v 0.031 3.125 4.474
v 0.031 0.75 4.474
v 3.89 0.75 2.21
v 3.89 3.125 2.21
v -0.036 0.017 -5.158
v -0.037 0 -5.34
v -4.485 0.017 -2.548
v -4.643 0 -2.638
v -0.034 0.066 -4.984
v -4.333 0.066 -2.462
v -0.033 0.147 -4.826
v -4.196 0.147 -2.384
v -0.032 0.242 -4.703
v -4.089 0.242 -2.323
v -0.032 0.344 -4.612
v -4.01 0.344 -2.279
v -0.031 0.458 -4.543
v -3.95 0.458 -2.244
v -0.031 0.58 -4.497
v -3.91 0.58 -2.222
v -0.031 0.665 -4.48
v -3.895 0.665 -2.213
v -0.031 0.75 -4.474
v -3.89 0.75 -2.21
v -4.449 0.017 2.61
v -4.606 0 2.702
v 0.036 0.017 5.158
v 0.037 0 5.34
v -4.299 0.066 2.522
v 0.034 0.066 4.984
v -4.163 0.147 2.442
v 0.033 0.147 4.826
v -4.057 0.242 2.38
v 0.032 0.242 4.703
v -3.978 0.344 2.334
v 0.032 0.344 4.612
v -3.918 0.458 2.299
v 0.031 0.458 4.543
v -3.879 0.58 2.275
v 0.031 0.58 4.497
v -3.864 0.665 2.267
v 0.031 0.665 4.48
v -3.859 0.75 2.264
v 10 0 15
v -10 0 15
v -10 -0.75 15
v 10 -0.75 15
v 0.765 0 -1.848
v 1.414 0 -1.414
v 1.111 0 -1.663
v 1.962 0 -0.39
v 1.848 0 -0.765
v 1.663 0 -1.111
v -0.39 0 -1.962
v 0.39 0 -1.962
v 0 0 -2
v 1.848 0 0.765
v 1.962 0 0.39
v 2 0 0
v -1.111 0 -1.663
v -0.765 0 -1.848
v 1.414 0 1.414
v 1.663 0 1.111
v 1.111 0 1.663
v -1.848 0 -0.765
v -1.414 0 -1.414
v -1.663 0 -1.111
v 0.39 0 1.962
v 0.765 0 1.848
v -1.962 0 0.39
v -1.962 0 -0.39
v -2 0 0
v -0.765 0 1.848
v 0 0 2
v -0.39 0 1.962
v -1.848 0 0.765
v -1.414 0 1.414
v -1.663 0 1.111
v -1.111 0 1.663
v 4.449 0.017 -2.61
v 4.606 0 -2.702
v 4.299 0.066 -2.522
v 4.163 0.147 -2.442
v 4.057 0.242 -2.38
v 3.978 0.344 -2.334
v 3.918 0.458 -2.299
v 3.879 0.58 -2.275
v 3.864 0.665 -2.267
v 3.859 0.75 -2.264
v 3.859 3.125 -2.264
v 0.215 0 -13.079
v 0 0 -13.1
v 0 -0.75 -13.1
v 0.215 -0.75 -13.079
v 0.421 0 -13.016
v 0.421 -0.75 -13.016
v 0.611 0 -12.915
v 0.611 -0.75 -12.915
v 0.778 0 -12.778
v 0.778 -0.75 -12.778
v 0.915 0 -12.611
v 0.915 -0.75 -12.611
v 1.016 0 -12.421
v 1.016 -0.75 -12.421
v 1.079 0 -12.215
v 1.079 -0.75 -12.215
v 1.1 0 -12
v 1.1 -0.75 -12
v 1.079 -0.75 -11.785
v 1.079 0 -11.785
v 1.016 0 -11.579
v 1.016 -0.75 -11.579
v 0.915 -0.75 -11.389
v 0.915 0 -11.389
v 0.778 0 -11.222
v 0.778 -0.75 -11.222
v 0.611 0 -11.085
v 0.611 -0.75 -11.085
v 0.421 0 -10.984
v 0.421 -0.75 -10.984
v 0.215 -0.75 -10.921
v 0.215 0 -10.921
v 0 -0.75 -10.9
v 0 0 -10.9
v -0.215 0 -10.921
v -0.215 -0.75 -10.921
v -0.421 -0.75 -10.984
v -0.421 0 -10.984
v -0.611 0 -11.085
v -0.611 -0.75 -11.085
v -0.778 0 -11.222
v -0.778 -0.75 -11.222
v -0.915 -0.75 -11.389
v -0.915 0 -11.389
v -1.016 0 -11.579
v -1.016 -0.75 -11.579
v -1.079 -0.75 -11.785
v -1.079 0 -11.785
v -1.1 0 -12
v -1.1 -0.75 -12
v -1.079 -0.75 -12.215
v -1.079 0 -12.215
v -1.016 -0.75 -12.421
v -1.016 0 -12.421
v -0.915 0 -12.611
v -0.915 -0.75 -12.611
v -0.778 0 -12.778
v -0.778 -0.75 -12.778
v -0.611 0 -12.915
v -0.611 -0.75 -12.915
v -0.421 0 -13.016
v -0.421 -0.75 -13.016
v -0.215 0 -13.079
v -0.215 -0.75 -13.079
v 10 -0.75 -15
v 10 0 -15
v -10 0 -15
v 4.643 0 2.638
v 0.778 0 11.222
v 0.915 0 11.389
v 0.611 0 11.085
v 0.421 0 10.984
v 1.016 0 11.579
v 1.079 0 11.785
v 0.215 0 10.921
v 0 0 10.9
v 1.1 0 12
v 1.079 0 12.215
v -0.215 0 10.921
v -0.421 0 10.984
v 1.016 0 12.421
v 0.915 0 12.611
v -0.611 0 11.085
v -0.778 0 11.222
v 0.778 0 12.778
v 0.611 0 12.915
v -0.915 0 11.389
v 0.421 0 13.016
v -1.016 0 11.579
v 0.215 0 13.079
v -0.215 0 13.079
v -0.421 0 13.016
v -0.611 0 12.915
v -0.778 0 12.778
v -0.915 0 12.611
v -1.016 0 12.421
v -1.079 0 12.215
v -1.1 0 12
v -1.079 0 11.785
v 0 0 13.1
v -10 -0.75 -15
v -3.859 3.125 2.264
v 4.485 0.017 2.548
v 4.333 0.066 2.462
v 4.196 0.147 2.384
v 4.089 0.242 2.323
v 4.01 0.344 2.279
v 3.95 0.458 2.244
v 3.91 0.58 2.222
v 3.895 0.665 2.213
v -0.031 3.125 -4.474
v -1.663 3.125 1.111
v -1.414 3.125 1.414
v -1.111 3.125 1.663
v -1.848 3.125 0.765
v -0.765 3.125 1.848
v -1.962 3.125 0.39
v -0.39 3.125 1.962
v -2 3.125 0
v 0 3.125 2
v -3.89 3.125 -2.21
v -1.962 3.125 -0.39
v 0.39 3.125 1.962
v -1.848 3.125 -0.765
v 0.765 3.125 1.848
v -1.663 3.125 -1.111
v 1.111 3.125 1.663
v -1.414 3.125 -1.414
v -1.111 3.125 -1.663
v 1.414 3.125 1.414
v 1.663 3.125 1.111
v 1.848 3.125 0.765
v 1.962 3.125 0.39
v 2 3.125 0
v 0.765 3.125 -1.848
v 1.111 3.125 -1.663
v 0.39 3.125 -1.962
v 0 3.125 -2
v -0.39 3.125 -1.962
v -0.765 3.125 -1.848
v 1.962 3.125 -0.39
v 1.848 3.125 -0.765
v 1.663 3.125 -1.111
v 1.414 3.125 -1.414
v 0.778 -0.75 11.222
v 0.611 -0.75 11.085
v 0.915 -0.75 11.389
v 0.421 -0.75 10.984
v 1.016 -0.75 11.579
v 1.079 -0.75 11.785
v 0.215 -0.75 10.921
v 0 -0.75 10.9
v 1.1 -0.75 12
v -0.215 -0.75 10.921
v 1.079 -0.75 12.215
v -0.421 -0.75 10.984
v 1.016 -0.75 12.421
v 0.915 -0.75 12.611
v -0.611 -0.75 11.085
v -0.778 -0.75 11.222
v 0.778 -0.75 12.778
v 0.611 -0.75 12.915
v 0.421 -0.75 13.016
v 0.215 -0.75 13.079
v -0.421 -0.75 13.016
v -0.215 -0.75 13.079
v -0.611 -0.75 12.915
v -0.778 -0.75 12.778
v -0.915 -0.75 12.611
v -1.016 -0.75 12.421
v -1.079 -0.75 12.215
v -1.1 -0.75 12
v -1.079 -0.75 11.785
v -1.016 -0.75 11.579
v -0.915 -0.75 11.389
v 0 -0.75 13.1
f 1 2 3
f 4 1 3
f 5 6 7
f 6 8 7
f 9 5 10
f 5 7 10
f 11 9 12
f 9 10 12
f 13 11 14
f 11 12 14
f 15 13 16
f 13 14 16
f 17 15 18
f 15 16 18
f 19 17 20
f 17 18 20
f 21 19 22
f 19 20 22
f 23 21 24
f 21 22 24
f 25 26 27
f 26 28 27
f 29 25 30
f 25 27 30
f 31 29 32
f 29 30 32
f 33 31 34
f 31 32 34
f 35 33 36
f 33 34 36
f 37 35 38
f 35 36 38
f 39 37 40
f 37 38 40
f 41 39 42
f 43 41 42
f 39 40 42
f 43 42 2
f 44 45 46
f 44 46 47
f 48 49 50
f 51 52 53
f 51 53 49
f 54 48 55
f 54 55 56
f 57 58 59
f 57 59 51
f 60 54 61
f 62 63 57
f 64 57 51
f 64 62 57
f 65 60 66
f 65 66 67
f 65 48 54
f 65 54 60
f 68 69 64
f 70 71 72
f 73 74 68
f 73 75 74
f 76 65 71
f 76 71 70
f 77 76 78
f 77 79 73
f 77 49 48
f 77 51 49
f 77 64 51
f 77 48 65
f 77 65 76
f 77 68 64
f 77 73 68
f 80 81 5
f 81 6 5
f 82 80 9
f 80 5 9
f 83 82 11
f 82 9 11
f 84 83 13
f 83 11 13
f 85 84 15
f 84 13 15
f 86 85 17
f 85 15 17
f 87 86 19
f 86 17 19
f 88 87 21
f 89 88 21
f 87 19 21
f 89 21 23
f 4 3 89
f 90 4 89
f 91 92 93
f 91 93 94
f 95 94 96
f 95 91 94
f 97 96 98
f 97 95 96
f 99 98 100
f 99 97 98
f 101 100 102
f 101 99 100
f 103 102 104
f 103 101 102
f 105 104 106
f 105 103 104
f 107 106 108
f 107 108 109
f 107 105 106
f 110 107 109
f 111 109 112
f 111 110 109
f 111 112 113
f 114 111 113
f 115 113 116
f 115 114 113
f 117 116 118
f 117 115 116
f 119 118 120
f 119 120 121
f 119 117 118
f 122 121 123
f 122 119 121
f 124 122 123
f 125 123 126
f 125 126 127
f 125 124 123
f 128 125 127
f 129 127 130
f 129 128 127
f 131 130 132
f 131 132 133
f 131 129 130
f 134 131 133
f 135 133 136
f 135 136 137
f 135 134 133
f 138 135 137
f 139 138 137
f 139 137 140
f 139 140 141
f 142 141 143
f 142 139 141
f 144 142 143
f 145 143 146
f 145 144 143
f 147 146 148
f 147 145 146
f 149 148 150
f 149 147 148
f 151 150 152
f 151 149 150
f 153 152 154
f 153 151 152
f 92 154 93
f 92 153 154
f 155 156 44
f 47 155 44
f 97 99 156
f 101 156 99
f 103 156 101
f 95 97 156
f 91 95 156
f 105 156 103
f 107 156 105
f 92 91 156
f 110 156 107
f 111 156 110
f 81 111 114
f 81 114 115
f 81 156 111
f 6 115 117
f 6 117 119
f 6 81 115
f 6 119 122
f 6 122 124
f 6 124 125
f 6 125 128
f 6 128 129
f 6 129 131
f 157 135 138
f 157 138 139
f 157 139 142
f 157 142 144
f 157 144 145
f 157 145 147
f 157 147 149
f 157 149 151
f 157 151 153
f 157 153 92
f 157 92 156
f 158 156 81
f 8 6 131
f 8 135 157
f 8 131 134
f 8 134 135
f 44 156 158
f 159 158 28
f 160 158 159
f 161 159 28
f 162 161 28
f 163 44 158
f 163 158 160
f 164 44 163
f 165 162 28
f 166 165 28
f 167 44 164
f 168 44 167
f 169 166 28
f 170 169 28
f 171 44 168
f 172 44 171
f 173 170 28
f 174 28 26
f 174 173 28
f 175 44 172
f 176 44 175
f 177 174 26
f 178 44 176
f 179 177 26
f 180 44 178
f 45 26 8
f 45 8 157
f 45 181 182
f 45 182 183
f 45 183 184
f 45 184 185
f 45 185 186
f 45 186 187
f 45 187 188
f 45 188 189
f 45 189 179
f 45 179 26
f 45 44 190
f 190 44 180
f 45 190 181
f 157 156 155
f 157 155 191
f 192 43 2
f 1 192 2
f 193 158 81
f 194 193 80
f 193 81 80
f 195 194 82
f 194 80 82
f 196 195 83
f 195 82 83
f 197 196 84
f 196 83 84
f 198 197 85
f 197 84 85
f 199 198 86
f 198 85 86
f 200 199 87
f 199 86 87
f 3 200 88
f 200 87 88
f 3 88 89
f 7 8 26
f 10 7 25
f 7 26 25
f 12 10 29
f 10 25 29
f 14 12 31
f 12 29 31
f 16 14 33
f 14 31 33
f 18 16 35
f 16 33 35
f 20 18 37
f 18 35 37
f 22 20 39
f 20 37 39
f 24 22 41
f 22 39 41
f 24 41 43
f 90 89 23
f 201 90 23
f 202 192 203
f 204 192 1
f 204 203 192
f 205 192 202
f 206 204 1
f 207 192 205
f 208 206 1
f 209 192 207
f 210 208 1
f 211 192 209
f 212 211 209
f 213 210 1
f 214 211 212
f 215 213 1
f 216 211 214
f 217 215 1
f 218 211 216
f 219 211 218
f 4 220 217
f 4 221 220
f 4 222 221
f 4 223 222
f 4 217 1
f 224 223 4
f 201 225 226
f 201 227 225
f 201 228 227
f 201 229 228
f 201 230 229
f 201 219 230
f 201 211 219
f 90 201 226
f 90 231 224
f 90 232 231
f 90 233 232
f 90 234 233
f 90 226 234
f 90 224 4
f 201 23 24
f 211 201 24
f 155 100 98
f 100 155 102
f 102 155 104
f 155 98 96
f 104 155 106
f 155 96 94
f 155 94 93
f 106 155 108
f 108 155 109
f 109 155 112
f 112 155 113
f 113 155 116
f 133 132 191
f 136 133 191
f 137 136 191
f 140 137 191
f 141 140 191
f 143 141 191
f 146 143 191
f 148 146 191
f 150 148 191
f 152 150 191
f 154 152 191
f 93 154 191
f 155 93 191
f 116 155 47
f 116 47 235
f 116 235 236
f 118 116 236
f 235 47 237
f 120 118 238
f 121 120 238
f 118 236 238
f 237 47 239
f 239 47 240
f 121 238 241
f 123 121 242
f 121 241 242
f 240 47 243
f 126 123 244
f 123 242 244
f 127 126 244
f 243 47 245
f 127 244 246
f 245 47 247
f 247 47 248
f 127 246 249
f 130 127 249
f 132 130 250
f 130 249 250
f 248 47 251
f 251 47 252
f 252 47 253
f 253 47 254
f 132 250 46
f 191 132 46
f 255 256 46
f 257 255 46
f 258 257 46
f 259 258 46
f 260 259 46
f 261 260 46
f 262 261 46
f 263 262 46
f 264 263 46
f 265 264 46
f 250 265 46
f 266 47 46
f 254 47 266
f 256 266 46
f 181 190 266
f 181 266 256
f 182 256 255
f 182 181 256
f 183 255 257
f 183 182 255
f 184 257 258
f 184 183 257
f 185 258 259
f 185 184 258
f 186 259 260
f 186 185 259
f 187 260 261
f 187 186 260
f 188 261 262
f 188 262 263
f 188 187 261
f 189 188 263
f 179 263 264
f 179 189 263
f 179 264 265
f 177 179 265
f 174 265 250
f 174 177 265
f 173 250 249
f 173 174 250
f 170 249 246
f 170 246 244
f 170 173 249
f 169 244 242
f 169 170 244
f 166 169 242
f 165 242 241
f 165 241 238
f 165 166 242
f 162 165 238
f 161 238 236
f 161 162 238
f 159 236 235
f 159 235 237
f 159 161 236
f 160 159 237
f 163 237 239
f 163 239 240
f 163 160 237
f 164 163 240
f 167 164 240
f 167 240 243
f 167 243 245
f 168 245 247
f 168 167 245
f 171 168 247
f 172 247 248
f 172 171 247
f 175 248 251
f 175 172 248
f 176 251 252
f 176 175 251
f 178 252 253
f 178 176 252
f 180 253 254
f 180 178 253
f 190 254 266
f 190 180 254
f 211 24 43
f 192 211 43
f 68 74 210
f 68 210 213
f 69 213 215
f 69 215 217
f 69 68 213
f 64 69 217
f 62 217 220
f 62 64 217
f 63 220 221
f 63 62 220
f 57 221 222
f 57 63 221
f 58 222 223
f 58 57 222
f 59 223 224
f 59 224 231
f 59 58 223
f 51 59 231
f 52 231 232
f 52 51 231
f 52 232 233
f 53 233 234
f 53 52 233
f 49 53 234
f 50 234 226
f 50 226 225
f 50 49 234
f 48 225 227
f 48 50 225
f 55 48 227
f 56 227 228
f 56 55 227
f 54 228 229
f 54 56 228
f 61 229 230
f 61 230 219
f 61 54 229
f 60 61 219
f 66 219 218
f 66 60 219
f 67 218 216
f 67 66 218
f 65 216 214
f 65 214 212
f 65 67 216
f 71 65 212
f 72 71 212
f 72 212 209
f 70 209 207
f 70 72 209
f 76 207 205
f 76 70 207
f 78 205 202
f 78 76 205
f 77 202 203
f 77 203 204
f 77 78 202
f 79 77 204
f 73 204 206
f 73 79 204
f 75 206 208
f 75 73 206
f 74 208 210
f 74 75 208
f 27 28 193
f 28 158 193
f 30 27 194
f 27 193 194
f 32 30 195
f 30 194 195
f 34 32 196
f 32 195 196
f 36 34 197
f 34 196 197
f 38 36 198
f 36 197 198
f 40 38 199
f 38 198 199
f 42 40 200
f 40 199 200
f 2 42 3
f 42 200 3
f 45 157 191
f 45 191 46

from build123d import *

# Parameters (mm, degrees)
SKETCH1_R      = 2
EXTRUDE1_DEPTH = 3.125
SKETCH2_R      = 1.1
EXTRUDE2_DEPTH = 0.75
FILLET1_R      = 0.75


with BuildPart() as part:
    # Sketch1 → Extrude1 (new body)
    with BuildSketch(Plane(origin=(0, 0, 0), x_dir=(1, 0, 0), z_dir=(0, 1, 0))):
        Polygon((3.859462612, 2.263930582), (-0.030890091, 4.474357958), (-3.890352703, 2.210427376), (-3.859462612, -2.263930582), (0.030890091, -4.474357958), (3.890352703, -2.210427376), align=None)
        with Locations(Location((0, 0, 0), (0, 0, 270))):  # turned: the seam where the file's is
            Circle(SKETCH1_R, mode=Mode.SUBTRACT)
    extrude(amount=EXTRUDE1_DEPTH)

    # Sketch2 → Extrude2 (add)
    with BuildSketch(Plane.XZ):
        Polygon((10, 0), (10, -15), (-10, -15), (-10, 15), (10, 15), align=None)
        with Locations(Location((0, -12, 0), (0, 0, 270))):  # turned: the seam where the file's is
            Circle(SKETCH2_R, mode=Mode.SUBTRACT)
        with Locations(Location((0, 12, 0), (0, 0, 90))):  # turned: the seam where the file's is
            Circle(SKETCH2_R, mode=Mode.SUBTRACT)
    extrude(amount=EXTRUDE2_DEPTH)

    # Fillet1
    fillet1_edges = [part.edges().sort_by_distance(p)[0] for p in [
        (1.960621397, 0, 3.342392667),
        (-1.91428626, 0, 3.36914427),
        (-3.874907657, 0, 0.026751603),
        (-1.960621397, 0, -3.342392667),
        (1.91428626, 0, -3.36914427),
        (3.874907657, 0, -0.026751603),
    ]]
    fillet(fillet1_edges, radius=FILLET1_R)


solid = part.part
